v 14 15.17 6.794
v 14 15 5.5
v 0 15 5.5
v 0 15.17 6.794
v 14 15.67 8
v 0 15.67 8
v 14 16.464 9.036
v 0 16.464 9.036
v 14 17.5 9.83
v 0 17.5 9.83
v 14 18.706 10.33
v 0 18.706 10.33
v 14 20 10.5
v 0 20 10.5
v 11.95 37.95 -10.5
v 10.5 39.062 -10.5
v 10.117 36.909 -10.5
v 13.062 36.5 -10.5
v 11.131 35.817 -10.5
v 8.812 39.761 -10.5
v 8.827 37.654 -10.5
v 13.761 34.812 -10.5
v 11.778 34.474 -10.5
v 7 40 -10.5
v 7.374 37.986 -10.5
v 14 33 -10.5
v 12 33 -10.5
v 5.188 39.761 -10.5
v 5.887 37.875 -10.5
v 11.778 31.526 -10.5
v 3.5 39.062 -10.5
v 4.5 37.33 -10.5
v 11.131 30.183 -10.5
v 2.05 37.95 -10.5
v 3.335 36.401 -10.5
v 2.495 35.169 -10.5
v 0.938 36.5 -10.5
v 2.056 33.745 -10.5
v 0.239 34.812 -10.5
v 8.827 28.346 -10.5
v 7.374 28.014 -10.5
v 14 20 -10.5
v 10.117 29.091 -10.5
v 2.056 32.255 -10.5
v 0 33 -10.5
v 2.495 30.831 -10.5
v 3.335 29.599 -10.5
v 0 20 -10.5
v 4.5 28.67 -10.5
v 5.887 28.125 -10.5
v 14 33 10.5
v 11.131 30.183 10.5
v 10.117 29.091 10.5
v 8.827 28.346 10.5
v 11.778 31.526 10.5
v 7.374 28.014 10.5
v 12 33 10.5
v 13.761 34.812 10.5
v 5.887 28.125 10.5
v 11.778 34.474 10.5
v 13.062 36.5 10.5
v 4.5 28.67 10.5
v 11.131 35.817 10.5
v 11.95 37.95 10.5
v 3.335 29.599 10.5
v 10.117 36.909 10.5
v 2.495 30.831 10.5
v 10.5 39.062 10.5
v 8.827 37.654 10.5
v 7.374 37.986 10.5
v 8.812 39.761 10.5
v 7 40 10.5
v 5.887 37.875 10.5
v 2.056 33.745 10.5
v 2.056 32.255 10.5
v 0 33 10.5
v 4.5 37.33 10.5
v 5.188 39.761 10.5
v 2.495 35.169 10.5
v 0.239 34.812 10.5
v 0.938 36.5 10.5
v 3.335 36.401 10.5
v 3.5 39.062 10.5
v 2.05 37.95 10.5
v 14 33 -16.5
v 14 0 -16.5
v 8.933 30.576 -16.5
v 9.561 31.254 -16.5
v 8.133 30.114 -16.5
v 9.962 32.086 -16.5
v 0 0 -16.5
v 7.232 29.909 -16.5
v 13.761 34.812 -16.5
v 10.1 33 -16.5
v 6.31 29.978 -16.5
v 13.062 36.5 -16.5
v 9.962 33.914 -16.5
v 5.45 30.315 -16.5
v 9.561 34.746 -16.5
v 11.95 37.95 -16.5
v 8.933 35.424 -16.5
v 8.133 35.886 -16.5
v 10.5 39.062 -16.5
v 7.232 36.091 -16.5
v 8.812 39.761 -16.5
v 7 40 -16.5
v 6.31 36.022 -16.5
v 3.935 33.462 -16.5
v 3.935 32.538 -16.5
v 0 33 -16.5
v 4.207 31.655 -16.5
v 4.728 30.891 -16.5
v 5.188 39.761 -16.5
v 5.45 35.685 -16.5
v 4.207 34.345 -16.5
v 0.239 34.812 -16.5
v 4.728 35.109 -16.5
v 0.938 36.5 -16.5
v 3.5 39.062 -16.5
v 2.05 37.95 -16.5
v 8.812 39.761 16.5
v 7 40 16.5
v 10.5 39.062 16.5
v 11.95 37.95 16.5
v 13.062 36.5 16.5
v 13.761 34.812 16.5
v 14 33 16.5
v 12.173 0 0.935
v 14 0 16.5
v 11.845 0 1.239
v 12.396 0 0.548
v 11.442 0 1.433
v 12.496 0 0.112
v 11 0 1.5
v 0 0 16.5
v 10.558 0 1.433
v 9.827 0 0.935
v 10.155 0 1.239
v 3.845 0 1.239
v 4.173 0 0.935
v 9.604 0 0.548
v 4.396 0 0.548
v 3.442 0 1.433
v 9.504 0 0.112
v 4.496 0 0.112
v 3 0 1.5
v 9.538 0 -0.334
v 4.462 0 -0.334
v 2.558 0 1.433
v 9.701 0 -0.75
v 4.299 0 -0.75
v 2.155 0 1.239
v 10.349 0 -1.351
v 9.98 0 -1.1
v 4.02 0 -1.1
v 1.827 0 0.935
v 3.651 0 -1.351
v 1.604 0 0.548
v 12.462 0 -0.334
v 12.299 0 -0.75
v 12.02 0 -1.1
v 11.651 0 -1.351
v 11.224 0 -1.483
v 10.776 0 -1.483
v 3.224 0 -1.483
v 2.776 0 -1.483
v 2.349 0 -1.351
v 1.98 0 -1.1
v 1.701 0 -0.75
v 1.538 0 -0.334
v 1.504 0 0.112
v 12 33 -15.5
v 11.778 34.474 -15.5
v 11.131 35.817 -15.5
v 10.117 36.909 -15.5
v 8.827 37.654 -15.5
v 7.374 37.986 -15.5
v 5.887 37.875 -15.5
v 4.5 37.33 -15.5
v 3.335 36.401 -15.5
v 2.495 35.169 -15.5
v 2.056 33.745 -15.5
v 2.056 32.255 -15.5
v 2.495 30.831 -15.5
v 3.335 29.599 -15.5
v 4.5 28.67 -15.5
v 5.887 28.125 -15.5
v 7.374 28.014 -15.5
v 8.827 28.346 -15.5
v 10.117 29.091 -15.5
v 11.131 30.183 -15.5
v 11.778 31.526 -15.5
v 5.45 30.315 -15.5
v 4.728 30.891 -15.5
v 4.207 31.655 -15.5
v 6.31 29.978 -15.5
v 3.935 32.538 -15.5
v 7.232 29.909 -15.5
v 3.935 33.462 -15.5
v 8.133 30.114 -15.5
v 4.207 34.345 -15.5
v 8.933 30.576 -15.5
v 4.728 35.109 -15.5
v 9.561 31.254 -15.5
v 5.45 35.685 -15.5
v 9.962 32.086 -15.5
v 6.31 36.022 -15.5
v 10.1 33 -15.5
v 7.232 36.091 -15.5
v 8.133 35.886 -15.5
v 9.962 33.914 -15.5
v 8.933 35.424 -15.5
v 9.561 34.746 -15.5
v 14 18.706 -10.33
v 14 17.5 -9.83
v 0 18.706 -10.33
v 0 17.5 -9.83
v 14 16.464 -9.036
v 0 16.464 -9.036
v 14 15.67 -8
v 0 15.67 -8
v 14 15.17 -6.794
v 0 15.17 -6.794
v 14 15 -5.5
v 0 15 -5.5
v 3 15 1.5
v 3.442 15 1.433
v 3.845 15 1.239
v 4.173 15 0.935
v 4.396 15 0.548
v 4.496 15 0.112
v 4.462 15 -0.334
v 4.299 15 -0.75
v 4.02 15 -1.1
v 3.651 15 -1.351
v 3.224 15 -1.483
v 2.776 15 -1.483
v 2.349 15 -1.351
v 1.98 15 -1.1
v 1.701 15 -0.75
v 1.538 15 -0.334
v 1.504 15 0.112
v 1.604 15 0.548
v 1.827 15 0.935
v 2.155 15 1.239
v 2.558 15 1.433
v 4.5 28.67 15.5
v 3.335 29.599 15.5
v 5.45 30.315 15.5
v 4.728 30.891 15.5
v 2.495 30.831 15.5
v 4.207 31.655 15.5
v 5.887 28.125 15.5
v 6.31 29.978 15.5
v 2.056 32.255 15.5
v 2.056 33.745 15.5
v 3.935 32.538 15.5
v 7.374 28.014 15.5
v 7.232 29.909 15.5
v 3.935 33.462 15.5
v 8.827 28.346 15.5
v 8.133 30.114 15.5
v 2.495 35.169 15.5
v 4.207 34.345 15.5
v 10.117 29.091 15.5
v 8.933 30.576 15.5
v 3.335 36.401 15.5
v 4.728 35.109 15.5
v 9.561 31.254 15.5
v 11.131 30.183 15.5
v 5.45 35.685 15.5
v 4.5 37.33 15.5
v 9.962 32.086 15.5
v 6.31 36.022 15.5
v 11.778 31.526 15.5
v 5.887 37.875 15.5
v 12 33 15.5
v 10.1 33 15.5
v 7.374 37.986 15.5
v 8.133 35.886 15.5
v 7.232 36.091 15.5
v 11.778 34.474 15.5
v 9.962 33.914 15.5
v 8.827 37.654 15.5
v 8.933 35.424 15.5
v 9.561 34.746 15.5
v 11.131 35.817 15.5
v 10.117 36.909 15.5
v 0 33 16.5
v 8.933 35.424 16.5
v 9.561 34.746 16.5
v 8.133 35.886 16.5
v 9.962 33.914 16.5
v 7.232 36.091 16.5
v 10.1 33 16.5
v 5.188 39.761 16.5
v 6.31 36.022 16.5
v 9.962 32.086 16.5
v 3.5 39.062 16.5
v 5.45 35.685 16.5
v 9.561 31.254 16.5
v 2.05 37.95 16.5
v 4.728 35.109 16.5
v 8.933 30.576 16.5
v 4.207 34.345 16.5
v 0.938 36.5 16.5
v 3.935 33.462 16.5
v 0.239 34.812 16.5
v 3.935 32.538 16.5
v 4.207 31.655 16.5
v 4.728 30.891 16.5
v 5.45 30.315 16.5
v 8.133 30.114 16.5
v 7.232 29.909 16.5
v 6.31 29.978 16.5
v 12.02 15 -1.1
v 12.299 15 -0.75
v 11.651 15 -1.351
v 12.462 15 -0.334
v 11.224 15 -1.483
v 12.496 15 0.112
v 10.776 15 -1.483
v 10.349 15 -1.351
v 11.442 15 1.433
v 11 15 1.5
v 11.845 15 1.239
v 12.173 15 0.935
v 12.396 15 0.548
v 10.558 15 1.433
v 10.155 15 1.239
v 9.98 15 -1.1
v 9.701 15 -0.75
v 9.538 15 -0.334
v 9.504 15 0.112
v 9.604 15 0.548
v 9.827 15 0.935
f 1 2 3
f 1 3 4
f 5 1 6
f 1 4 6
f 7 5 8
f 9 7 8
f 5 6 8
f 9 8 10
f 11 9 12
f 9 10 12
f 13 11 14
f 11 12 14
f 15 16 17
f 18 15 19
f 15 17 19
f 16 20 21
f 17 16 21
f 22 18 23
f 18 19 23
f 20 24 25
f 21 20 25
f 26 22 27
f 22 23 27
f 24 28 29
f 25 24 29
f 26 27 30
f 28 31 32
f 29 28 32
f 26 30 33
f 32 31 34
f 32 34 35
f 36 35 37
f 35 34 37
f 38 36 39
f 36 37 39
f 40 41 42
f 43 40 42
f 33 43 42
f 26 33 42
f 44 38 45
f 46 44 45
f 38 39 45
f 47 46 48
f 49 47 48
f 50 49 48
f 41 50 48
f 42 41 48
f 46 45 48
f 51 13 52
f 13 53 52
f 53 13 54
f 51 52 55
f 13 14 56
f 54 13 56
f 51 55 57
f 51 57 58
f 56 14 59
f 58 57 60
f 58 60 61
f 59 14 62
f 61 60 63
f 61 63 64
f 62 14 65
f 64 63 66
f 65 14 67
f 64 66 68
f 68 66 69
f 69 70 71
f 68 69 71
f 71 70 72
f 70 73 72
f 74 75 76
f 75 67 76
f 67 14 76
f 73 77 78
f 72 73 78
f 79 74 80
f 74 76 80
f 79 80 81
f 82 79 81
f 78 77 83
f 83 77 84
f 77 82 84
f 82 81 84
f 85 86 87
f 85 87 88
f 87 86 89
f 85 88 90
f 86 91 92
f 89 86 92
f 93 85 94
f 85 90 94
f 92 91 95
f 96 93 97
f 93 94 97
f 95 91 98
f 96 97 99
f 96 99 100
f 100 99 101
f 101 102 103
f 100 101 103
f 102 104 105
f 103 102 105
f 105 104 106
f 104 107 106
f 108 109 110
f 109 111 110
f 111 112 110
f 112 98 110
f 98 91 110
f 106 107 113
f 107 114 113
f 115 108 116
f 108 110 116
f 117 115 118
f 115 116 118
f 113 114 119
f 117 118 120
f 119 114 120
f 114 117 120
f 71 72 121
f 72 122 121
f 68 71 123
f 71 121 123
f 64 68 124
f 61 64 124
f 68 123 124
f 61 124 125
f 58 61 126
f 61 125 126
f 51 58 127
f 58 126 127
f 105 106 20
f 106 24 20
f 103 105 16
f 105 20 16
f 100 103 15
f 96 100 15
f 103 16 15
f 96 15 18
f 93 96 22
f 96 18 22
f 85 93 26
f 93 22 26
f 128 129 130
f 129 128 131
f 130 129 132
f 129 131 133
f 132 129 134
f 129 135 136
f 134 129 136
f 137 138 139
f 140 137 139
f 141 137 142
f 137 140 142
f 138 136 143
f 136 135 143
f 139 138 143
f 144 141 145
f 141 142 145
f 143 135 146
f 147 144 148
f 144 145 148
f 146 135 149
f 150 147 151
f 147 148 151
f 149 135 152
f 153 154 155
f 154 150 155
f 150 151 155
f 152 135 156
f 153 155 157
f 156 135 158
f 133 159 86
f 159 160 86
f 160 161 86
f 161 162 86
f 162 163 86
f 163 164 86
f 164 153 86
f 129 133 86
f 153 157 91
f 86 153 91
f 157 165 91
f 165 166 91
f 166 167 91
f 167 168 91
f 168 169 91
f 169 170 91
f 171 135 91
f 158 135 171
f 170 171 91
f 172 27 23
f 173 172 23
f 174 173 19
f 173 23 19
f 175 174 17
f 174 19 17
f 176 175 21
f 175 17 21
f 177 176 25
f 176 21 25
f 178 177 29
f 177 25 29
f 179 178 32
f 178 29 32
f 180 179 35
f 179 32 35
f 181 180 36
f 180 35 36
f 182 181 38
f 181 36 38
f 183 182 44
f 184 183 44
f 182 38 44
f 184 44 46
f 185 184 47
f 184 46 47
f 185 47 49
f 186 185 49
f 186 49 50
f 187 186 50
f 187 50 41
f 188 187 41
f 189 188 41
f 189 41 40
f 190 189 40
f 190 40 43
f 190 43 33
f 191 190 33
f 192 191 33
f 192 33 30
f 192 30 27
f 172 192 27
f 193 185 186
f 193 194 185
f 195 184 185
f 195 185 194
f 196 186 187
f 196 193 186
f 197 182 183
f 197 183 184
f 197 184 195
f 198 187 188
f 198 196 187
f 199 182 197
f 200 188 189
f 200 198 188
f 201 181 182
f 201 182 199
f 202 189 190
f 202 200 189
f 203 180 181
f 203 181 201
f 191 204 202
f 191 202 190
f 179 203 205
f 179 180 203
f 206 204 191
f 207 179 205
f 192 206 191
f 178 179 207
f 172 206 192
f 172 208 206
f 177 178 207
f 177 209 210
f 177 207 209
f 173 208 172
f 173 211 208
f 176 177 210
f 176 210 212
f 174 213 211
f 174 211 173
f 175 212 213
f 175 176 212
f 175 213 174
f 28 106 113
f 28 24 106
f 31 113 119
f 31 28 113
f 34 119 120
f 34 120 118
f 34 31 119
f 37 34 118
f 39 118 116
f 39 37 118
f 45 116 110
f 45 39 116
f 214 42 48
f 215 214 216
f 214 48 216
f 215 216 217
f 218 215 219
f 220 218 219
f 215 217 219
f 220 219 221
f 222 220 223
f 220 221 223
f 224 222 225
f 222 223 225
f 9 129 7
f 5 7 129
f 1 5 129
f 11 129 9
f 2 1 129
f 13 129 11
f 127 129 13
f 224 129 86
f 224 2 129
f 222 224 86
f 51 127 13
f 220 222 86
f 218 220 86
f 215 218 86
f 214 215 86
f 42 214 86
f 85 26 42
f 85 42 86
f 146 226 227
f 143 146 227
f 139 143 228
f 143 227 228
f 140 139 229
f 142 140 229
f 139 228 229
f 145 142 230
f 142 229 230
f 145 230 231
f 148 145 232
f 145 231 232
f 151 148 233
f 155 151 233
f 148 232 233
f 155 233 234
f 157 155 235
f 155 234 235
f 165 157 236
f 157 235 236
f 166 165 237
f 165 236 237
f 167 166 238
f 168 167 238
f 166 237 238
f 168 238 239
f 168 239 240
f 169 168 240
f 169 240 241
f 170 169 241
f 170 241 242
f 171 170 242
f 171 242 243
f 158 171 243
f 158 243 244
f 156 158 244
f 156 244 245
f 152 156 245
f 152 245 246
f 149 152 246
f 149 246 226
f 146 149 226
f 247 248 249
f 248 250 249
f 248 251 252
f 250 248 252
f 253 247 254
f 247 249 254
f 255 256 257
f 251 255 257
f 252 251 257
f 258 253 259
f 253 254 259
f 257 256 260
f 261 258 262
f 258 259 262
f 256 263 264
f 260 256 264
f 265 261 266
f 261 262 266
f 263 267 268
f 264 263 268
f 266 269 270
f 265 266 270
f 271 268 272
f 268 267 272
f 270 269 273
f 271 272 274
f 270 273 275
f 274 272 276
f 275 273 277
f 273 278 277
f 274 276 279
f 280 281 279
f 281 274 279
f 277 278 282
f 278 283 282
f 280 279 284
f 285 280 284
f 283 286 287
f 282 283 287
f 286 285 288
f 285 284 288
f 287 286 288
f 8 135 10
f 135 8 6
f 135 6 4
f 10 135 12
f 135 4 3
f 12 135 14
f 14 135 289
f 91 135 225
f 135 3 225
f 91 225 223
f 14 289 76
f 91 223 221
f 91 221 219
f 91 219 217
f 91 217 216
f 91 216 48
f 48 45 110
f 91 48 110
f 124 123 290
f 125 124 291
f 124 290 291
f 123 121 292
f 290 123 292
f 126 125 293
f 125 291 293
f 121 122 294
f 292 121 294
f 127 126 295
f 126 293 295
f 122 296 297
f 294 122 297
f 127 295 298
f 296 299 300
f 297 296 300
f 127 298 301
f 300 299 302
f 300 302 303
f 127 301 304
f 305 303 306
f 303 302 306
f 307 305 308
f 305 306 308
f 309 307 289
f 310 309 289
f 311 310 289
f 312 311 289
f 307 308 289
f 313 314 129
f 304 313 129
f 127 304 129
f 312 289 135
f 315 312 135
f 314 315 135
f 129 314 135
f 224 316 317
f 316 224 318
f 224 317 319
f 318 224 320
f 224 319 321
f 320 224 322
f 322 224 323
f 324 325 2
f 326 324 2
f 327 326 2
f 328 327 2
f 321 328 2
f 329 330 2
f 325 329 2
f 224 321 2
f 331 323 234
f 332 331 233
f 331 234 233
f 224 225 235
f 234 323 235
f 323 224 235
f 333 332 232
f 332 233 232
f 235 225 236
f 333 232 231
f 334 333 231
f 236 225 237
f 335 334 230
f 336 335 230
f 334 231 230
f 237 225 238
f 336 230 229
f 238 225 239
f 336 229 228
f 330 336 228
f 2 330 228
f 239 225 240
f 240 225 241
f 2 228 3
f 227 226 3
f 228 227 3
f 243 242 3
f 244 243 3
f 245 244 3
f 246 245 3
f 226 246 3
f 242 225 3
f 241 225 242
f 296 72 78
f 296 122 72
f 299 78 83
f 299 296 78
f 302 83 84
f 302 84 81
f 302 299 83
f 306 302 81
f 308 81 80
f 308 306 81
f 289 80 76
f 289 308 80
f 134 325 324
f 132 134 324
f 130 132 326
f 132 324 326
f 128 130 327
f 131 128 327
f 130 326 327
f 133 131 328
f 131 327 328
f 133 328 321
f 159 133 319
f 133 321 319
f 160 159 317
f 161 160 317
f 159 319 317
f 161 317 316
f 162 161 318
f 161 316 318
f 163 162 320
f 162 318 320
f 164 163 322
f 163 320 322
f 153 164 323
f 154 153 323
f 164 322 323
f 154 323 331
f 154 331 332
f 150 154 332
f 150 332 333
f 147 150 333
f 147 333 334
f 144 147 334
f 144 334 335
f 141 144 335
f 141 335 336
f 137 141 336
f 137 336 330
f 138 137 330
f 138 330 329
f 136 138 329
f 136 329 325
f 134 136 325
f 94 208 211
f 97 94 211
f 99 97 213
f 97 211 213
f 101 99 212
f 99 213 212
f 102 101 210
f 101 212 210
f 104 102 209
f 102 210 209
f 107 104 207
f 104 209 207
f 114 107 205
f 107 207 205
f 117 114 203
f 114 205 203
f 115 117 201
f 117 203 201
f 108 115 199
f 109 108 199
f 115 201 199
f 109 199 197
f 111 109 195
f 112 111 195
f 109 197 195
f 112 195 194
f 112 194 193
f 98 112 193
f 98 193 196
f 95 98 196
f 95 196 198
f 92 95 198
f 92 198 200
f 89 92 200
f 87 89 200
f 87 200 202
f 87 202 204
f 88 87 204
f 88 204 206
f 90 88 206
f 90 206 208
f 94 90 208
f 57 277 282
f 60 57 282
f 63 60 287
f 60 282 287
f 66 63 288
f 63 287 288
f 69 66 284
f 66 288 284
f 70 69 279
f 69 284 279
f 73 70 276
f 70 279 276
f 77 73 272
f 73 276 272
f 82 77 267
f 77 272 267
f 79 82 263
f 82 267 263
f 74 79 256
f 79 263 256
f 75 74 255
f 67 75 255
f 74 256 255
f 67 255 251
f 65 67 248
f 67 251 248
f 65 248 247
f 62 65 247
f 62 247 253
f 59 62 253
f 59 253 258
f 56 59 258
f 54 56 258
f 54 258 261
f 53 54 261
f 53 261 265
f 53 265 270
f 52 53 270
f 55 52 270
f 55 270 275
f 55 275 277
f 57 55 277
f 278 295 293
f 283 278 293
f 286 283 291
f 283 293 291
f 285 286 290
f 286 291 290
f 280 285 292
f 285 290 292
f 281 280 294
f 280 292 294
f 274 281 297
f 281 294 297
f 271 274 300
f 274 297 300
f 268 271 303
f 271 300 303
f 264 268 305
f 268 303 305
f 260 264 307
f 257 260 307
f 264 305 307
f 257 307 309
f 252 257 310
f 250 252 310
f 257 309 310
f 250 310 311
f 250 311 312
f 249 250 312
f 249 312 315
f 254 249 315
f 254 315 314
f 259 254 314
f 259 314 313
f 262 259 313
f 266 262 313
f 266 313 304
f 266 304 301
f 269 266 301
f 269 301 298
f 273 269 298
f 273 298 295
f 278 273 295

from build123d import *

# Parameters (mm, degrees)
EXTRUDE_1_DEPTH     = 14
FILLET_1_R          = 7
CUT_EXTRUDE_START   = -1
SKETCH_7_R          = 5
CUT_EXTRUDE_1_DEPTH = 31
SKETCH_8_R          = 3.1
CUT_EXTRUDE_2_DEPTH = 35
CUT_EXTRUDE_START_2 = 2
SKETCH_10_R         = 1.5
CUT_EXTRUDE_3_DEPTH = 20


with BuildPart() as part:
    # 草图4 → 凸台-拉伸1 (new body)
    with BuildSketch(Plane(origin=(0, 0, 0), x_dir=(0, 0, -1), z_dir=(1, 0, 0))):
        with BuildLine():
            Line((0, 0), (16.5, 0))
            Line((16.5, 0), (16.5, 40))
            Line((16.5, 40), (10.5, 40))
            Line((10.5, 40), (10.5, 20))
            ThreePointArc((10.5, 20), (9.035533906, 16.464466094), (5.5, 15))
            Line((5.5, 15), (-5.5, 15))
            ThreePointArc((-5.5, 15), (-9.035533906, 16.464466094), (-10.5, 20))
            Line((-10.5, 20), (-10.5, 40))
            Line((-10.5, 40), (-16.5, 40))
            Line((-16.5, 40), (-16.5, 0))
            Line((-16.5, 0), (0, 0))
        make_face()
    extrude(amount=EXTRUDE_1_DEPTH)

    # 圆角1
    fillet_1_edges = [part.edges().sort_by_distance(p)[0] for p in [
        (0, 40, 13.5),
        (0, 40, -13.5),
        (14, 40, -13.5),
        (14, 40, 13.5),
    ]]
    fillet(fillet_1_edges, radius=FILLET_1_R - 0.0001)  # a hair under: the kernel refuses the full size

    # 草图7 → 切除-拉伸1 (cut)
    with BuildSketch(Plane.XY.offset(16.5).offset(CUT_EXTRUDE_START)):
        with Locations((7, 33)):
            Circle(SKETCH_7_R)
    extrude(amount=-CUT_EXTRUDE_1_DEPTH, mode=Mode.SUBTRACT)

    # 草图8 → 切除-拉伸2 (cut)
    with BuildSketch(Plane.XY.offset(16.5)):
        with Locations((7, 33)):
            Circle(SKETCH_8_R)
    extrude(amount=-CUT_EXTRUDE_2_DEPTH, mode=Mode.SUBTRACT)

    # 草图10 → 切除-拉伸3 (cut)
    with BuildSketch(Plane(origin=(0, 15, 0), x_dir=(1, 0, 0), z_dir=(0, 1, 0)).offset(CUT_EXTRUDE_START_2)):
        with Locations(Location((3, 0, 0), (0, 0, 270))):
            Circle(SKETCH_10_R)
        with Locations(Location((11, 0, 0), (0, 0, 270))):
            Circle(SKETCH_10_R)
    extrude(amount=-CUT_EXTRUDE_3_DEPTH, mode=Mode.SUBTRACT)


solid = part.part
